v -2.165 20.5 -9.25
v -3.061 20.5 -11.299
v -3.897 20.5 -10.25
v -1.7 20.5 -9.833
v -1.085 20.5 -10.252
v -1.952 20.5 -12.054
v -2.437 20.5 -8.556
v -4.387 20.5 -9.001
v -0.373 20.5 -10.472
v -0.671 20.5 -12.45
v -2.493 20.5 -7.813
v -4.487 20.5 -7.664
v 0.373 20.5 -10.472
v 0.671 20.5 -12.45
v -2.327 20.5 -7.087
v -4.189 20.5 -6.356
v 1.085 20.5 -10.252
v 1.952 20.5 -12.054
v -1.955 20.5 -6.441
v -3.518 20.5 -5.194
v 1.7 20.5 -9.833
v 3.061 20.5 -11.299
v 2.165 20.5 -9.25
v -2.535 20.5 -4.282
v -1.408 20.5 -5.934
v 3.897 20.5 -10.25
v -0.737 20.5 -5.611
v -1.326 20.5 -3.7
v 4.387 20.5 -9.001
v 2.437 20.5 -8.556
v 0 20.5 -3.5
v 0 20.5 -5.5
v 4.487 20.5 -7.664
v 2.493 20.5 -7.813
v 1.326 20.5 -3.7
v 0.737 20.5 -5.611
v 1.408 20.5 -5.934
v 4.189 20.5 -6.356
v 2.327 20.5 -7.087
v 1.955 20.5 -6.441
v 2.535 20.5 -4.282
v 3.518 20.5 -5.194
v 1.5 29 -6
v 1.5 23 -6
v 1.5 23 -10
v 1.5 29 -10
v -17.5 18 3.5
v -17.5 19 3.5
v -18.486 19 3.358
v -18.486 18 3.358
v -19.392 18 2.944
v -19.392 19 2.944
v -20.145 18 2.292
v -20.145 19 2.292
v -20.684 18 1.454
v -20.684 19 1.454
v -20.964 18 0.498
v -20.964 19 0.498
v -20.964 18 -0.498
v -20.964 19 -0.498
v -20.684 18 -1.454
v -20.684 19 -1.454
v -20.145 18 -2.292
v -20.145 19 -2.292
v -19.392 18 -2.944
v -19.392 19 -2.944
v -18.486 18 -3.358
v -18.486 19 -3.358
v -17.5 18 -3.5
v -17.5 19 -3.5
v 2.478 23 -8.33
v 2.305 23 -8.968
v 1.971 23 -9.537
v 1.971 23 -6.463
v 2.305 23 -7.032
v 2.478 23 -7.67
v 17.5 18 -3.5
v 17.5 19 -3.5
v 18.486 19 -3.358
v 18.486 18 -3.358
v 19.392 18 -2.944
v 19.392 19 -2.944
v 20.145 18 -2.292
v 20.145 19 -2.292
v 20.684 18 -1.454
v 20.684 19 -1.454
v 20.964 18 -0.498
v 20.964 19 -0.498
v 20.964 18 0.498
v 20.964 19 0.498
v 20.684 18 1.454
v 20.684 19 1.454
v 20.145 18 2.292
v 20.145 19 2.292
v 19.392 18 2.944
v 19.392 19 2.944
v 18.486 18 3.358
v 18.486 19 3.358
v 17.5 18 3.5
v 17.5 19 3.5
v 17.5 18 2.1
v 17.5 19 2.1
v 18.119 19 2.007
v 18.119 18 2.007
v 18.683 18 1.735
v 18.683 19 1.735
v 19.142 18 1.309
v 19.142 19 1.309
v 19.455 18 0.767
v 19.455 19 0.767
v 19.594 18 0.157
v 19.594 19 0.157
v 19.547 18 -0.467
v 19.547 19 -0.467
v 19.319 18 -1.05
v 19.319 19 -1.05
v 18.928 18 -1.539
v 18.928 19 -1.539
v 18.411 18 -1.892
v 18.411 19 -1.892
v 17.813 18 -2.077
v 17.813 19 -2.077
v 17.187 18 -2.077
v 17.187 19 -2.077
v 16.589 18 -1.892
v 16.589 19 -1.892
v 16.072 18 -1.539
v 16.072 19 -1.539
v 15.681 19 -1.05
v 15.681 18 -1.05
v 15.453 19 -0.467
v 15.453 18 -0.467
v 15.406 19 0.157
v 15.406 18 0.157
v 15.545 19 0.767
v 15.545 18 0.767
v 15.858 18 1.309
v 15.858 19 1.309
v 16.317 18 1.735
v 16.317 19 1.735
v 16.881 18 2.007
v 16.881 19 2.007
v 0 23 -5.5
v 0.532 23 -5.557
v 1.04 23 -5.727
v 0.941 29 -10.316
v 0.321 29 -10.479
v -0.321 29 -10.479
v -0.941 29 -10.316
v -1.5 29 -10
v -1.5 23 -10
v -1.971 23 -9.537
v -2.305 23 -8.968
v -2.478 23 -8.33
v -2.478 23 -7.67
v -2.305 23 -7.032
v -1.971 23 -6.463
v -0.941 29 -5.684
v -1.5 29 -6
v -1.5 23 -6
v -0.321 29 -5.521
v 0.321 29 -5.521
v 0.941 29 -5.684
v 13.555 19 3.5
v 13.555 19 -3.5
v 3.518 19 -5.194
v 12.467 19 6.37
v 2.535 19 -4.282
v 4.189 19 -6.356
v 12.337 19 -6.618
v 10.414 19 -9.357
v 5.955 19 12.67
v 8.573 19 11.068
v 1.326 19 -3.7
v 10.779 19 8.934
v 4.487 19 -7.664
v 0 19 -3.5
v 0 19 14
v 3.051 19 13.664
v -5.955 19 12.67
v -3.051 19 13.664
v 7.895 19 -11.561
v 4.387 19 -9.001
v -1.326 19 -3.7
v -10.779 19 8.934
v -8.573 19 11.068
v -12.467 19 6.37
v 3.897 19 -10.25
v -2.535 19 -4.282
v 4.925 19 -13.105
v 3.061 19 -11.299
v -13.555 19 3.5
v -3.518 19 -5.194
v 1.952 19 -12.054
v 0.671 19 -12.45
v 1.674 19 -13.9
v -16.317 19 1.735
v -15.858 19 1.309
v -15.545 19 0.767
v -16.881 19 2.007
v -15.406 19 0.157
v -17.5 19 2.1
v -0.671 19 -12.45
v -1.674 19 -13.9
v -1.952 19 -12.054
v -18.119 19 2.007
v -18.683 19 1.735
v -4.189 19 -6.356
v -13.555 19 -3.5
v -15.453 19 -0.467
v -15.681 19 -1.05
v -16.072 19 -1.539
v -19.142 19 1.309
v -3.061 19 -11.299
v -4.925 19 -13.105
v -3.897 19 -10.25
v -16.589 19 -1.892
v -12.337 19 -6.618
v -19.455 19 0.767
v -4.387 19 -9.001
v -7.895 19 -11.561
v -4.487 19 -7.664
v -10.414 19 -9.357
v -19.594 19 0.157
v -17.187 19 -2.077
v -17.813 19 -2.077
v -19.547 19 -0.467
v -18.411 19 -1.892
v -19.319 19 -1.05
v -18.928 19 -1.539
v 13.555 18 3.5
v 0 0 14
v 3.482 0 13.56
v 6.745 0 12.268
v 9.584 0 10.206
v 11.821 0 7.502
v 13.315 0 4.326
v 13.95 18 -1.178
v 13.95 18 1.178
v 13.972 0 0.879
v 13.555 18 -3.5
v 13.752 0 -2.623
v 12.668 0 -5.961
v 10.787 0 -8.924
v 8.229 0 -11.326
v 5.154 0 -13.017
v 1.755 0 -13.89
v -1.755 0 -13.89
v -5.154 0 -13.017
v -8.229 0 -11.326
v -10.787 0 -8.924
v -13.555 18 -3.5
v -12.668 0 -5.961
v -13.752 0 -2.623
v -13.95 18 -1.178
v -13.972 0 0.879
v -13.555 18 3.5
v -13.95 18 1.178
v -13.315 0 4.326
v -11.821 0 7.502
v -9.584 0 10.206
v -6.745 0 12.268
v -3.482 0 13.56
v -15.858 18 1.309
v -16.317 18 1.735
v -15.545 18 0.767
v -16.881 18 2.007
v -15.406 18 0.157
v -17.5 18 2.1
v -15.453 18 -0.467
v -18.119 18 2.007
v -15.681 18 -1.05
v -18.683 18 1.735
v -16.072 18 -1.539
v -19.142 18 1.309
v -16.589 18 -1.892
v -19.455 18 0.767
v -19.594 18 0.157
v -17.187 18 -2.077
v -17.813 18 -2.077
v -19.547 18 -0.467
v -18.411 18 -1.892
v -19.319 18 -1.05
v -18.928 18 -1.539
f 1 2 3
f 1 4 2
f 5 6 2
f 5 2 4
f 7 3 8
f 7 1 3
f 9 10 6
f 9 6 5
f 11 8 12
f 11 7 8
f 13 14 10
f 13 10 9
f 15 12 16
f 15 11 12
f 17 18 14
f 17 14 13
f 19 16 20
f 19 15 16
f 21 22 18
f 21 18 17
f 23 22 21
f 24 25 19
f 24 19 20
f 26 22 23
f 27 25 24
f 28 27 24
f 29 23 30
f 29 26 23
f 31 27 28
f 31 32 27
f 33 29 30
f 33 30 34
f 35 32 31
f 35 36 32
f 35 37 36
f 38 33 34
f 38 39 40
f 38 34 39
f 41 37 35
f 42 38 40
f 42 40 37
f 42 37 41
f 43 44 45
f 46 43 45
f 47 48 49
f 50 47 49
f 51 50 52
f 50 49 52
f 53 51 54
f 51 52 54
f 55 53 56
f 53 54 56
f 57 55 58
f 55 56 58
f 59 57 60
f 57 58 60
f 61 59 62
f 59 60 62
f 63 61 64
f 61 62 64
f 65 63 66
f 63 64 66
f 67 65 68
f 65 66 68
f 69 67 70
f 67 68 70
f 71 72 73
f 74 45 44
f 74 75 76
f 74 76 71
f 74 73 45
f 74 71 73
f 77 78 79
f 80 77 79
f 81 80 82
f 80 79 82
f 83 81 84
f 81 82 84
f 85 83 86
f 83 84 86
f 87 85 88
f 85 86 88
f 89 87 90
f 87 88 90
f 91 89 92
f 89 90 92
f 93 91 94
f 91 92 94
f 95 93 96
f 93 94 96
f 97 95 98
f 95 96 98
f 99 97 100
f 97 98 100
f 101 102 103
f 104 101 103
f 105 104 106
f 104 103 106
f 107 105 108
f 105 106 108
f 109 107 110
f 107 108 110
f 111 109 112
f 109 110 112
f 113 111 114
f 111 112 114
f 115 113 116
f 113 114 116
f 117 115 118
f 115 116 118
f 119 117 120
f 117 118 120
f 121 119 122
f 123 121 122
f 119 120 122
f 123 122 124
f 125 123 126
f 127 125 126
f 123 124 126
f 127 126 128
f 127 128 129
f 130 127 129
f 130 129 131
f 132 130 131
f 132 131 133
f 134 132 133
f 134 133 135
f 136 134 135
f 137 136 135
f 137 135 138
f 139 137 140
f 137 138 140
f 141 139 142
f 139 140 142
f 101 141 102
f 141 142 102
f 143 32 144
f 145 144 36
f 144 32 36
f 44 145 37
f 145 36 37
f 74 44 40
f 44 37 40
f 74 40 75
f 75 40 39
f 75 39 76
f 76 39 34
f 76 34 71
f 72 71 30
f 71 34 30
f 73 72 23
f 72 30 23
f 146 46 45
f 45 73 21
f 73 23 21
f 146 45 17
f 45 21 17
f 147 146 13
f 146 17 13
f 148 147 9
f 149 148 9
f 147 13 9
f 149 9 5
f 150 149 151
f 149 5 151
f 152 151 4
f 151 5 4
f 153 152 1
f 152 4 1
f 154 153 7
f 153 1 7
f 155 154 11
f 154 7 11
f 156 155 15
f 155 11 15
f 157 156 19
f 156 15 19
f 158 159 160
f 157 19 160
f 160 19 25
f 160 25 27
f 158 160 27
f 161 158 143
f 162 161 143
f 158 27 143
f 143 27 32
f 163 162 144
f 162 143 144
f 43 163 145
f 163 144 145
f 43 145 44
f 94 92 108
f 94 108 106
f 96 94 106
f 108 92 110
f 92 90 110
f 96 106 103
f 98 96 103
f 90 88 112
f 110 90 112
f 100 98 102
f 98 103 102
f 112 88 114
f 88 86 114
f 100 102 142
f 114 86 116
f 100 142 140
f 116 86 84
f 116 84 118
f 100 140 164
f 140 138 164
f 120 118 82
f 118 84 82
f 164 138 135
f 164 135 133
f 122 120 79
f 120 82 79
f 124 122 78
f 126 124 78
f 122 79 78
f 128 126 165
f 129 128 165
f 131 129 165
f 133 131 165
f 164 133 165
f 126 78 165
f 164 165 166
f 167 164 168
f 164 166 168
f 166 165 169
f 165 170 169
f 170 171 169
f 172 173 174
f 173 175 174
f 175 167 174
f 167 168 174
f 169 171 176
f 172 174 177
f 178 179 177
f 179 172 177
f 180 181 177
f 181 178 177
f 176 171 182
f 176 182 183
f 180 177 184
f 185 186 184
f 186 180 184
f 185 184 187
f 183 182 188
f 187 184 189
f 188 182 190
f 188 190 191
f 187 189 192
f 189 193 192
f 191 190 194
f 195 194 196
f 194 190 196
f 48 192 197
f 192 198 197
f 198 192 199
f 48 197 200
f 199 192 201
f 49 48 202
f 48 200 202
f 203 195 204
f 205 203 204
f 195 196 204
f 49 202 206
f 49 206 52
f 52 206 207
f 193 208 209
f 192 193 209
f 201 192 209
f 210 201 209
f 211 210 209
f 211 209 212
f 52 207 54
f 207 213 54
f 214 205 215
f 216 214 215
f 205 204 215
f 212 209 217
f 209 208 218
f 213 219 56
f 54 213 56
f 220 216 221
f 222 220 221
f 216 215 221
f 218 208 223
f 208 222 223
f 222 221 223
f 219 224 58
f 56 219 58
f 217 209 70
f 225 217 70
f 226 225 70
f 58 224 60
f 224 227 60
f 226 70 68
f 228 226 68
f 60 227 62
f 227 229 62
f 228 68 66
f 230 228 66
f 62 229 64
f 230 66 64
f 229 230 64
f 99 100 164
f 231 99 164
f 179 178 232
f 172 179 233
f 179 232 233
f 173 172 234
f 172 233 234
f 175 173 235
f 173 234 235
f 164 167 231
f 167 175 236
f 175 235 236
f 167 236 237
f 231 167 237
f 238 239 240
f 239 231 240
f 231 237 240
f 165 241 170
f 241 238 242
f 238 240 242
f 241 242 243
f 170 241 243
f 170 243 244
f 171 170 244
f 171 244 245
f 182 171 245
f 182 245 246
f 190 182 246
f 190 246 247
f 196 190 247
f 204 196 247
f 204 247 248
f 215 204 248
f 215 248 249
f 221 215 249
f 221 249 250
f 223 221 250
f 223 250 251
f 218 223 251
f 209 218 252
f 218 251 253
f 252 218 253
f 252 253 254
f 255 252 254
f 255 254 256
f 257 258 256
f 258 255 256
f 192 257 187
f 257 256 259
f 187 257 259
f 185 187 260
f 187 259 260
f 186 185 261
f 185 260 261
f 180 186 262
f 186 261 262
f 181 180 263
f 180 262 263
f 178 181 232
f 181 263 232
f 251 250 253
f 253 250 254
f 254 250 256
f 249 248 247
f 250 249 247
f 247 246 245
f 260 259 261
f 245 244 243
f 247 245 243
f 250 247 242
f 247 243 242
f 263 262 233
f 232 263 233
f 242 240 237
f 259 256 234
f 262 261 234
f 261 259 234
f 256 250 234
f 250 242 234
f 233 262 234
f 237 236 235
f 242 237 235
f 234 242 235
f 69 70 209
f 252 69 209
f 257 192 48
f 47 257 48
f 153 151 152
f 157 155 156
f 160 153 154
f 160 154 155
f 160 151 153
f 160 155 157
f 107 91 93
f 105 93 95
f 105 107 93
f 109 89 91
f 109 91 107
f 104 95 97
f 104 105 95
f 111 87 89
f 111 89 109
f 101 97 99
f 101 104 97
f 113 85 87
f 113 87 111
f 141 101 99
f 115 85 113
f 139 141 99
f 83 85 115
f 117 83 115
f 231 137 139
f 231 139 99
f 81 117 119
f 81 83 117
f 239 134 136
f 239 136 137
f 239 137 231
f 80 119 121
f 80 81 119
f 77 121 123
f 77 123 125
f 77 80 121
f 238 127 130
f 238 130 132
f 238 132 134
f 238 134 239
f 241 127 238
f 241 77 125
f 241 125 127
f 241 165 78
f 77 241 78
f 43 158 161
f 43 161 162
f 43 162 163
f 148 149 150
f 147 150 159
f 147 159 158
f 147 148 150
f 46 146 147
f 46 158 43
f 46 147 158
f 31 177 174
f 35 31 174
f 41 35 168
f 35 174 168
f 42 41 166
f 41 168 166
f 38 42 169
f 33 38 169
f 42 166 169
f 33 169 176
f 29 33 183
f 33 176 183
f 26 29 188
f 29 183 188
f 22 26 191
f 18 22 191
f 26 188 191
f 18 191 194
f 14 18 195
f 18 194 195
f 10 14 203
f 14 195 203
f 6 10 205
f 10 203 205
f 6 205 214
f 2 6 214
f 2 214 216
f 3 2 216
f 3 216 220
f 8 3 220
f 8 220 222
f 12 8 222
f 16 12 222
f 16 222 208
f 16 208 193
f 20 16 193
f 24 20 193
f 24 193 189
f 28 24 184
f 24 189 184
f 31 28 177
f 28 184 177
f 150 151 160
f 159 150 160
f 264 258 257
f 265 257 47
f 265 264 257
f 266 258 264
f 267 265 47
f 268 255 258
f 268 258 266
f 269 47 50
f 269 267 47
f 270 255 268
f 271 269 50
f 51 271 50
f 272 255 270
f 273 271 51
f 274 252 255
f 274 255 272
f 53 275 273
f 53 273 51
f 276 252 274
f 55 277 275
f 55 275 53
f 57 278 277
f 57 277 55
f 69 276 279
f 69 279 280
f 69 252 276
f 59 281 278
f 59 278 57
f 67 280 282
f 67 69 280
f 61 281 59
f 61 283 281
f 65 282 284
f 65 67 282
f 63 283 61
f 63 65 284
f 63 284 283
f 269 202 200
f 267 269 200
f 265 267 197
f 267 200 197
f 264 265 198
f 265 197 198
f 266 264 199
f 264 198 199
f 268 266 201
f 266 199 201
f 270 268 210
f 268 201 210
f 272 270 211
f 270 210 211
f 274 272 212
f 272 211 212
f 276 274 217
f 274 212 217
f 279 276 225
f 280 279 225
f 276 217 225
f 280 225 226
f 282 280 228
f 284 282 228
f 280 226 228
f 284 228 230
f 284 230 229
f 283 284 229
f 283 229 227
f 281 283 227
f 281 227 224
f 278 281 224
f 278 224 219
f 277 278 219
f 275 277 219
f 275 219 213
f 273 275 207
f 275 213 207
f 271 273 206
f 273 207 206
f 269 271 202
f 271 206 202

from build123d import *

# Parameters (mm, degrees)
SKETCH_1_R      = 14
EXTRUDE_1_DEPTH = 19
SKETCH_2_R      = 2.1
EXTRUDE_2_DEPTH = 1
SKETCH_3_R      = 4.5
EXTRUDE_3_DEPTH = 1.5
SKETCH_4_R      = 2.5
EXTRUDE_4_DEPTH = 2.5
EXTRUDE_5_DEPTH = 6


with BuildPart() as part:
    # 草图1 → 凸台-拉伸1 (new body)
    with BuildSketch(Plane(origin=(0, 0, 0), x_dir=(1, 0, 0), z_dir=(0, 1, 0))):
        with Locations(Location((0, 0, 0), (0, 0, 270))):
            Circle(SKETCH_1_R)
    extrude(amount=EXTRUDE_1_DEPTH)

    # 草图2 → 凸台-拉伸2 (add)
    with BuildSketch(Plane(origin=(0, 19, 0), x_dir=(1, 0, 0), z_dir=(0, 1, 0))):
        with BuildLine():
            Line((-17.5, 3.5), (17.5, 3.5))
            ThreePointArc((17.5, 3.5), (21, 0), (17.5, -3.5))
            Line((17.5, -3.5), (-17.5, -3.5))
            ThreePointArc((-17.5, -3.5), (-21, 0), (-17.5, 3.5))
        make_face()
        with Locations(Location((-17.5, 0, 0), (0, 0, 270))):
            Circle(SKETCH_2_R, mode=Mode.SUBTRACT)
        with Locations(Location((17.5, 0, 0), (0, 0, 270))):
            Circle(SKETCH_2_R, mode=Mode.SUBTRACT)
    extrude(amount=-EXTRUDE_2_DEPTH)

    # 草图3 → 凸台-拉伸3 (add)
    with BuildSketch(Plane(origin=(0, 19, 0), x_dir=(1, 0, 0), z_dir=(0, 1, 0))):
        with Locations(Location((0, 8, 0), (0, 0, 270))):
            Circle(SKETCH_3_R)
    extrude(amount=EXTRUDE_3_DEPTH)

    # 草图4 → 凸台-拉伸4 (add)
    with BuildSketch(Plane(origin=(0, 20.5, 0), x_dir=(1, 0, 0), z_dir=(0, 1, 0))):
        with Locations(Location((0, 8, 0), (0, 0, 270))):
            Circle(SKETCH_4_R)
    extrude(amount=EXTRUDE_4_DEPTH)

    # 草图5 → 凸台-拉伸5 (add)
    with BuildSketch(Plane(origin=(0, 23, 0), x_dir=(1, 0, 0), z_dir=(0, 1, 0))):
        with BuildLine():
            Line((-1.5, 10), (-1.5, 6))
            ThreePointArc((-1.5, 6), (0, 5.5), (1.5, 6))
            Line((1.5, 6), (1.5, 10))
            ThreePointArc((1.5, 10), (0, 10.5), (-1.5, 10))
        make_face()
    extrude(amount=EXTRUDE_5_DEPTH)


solid = part.part
